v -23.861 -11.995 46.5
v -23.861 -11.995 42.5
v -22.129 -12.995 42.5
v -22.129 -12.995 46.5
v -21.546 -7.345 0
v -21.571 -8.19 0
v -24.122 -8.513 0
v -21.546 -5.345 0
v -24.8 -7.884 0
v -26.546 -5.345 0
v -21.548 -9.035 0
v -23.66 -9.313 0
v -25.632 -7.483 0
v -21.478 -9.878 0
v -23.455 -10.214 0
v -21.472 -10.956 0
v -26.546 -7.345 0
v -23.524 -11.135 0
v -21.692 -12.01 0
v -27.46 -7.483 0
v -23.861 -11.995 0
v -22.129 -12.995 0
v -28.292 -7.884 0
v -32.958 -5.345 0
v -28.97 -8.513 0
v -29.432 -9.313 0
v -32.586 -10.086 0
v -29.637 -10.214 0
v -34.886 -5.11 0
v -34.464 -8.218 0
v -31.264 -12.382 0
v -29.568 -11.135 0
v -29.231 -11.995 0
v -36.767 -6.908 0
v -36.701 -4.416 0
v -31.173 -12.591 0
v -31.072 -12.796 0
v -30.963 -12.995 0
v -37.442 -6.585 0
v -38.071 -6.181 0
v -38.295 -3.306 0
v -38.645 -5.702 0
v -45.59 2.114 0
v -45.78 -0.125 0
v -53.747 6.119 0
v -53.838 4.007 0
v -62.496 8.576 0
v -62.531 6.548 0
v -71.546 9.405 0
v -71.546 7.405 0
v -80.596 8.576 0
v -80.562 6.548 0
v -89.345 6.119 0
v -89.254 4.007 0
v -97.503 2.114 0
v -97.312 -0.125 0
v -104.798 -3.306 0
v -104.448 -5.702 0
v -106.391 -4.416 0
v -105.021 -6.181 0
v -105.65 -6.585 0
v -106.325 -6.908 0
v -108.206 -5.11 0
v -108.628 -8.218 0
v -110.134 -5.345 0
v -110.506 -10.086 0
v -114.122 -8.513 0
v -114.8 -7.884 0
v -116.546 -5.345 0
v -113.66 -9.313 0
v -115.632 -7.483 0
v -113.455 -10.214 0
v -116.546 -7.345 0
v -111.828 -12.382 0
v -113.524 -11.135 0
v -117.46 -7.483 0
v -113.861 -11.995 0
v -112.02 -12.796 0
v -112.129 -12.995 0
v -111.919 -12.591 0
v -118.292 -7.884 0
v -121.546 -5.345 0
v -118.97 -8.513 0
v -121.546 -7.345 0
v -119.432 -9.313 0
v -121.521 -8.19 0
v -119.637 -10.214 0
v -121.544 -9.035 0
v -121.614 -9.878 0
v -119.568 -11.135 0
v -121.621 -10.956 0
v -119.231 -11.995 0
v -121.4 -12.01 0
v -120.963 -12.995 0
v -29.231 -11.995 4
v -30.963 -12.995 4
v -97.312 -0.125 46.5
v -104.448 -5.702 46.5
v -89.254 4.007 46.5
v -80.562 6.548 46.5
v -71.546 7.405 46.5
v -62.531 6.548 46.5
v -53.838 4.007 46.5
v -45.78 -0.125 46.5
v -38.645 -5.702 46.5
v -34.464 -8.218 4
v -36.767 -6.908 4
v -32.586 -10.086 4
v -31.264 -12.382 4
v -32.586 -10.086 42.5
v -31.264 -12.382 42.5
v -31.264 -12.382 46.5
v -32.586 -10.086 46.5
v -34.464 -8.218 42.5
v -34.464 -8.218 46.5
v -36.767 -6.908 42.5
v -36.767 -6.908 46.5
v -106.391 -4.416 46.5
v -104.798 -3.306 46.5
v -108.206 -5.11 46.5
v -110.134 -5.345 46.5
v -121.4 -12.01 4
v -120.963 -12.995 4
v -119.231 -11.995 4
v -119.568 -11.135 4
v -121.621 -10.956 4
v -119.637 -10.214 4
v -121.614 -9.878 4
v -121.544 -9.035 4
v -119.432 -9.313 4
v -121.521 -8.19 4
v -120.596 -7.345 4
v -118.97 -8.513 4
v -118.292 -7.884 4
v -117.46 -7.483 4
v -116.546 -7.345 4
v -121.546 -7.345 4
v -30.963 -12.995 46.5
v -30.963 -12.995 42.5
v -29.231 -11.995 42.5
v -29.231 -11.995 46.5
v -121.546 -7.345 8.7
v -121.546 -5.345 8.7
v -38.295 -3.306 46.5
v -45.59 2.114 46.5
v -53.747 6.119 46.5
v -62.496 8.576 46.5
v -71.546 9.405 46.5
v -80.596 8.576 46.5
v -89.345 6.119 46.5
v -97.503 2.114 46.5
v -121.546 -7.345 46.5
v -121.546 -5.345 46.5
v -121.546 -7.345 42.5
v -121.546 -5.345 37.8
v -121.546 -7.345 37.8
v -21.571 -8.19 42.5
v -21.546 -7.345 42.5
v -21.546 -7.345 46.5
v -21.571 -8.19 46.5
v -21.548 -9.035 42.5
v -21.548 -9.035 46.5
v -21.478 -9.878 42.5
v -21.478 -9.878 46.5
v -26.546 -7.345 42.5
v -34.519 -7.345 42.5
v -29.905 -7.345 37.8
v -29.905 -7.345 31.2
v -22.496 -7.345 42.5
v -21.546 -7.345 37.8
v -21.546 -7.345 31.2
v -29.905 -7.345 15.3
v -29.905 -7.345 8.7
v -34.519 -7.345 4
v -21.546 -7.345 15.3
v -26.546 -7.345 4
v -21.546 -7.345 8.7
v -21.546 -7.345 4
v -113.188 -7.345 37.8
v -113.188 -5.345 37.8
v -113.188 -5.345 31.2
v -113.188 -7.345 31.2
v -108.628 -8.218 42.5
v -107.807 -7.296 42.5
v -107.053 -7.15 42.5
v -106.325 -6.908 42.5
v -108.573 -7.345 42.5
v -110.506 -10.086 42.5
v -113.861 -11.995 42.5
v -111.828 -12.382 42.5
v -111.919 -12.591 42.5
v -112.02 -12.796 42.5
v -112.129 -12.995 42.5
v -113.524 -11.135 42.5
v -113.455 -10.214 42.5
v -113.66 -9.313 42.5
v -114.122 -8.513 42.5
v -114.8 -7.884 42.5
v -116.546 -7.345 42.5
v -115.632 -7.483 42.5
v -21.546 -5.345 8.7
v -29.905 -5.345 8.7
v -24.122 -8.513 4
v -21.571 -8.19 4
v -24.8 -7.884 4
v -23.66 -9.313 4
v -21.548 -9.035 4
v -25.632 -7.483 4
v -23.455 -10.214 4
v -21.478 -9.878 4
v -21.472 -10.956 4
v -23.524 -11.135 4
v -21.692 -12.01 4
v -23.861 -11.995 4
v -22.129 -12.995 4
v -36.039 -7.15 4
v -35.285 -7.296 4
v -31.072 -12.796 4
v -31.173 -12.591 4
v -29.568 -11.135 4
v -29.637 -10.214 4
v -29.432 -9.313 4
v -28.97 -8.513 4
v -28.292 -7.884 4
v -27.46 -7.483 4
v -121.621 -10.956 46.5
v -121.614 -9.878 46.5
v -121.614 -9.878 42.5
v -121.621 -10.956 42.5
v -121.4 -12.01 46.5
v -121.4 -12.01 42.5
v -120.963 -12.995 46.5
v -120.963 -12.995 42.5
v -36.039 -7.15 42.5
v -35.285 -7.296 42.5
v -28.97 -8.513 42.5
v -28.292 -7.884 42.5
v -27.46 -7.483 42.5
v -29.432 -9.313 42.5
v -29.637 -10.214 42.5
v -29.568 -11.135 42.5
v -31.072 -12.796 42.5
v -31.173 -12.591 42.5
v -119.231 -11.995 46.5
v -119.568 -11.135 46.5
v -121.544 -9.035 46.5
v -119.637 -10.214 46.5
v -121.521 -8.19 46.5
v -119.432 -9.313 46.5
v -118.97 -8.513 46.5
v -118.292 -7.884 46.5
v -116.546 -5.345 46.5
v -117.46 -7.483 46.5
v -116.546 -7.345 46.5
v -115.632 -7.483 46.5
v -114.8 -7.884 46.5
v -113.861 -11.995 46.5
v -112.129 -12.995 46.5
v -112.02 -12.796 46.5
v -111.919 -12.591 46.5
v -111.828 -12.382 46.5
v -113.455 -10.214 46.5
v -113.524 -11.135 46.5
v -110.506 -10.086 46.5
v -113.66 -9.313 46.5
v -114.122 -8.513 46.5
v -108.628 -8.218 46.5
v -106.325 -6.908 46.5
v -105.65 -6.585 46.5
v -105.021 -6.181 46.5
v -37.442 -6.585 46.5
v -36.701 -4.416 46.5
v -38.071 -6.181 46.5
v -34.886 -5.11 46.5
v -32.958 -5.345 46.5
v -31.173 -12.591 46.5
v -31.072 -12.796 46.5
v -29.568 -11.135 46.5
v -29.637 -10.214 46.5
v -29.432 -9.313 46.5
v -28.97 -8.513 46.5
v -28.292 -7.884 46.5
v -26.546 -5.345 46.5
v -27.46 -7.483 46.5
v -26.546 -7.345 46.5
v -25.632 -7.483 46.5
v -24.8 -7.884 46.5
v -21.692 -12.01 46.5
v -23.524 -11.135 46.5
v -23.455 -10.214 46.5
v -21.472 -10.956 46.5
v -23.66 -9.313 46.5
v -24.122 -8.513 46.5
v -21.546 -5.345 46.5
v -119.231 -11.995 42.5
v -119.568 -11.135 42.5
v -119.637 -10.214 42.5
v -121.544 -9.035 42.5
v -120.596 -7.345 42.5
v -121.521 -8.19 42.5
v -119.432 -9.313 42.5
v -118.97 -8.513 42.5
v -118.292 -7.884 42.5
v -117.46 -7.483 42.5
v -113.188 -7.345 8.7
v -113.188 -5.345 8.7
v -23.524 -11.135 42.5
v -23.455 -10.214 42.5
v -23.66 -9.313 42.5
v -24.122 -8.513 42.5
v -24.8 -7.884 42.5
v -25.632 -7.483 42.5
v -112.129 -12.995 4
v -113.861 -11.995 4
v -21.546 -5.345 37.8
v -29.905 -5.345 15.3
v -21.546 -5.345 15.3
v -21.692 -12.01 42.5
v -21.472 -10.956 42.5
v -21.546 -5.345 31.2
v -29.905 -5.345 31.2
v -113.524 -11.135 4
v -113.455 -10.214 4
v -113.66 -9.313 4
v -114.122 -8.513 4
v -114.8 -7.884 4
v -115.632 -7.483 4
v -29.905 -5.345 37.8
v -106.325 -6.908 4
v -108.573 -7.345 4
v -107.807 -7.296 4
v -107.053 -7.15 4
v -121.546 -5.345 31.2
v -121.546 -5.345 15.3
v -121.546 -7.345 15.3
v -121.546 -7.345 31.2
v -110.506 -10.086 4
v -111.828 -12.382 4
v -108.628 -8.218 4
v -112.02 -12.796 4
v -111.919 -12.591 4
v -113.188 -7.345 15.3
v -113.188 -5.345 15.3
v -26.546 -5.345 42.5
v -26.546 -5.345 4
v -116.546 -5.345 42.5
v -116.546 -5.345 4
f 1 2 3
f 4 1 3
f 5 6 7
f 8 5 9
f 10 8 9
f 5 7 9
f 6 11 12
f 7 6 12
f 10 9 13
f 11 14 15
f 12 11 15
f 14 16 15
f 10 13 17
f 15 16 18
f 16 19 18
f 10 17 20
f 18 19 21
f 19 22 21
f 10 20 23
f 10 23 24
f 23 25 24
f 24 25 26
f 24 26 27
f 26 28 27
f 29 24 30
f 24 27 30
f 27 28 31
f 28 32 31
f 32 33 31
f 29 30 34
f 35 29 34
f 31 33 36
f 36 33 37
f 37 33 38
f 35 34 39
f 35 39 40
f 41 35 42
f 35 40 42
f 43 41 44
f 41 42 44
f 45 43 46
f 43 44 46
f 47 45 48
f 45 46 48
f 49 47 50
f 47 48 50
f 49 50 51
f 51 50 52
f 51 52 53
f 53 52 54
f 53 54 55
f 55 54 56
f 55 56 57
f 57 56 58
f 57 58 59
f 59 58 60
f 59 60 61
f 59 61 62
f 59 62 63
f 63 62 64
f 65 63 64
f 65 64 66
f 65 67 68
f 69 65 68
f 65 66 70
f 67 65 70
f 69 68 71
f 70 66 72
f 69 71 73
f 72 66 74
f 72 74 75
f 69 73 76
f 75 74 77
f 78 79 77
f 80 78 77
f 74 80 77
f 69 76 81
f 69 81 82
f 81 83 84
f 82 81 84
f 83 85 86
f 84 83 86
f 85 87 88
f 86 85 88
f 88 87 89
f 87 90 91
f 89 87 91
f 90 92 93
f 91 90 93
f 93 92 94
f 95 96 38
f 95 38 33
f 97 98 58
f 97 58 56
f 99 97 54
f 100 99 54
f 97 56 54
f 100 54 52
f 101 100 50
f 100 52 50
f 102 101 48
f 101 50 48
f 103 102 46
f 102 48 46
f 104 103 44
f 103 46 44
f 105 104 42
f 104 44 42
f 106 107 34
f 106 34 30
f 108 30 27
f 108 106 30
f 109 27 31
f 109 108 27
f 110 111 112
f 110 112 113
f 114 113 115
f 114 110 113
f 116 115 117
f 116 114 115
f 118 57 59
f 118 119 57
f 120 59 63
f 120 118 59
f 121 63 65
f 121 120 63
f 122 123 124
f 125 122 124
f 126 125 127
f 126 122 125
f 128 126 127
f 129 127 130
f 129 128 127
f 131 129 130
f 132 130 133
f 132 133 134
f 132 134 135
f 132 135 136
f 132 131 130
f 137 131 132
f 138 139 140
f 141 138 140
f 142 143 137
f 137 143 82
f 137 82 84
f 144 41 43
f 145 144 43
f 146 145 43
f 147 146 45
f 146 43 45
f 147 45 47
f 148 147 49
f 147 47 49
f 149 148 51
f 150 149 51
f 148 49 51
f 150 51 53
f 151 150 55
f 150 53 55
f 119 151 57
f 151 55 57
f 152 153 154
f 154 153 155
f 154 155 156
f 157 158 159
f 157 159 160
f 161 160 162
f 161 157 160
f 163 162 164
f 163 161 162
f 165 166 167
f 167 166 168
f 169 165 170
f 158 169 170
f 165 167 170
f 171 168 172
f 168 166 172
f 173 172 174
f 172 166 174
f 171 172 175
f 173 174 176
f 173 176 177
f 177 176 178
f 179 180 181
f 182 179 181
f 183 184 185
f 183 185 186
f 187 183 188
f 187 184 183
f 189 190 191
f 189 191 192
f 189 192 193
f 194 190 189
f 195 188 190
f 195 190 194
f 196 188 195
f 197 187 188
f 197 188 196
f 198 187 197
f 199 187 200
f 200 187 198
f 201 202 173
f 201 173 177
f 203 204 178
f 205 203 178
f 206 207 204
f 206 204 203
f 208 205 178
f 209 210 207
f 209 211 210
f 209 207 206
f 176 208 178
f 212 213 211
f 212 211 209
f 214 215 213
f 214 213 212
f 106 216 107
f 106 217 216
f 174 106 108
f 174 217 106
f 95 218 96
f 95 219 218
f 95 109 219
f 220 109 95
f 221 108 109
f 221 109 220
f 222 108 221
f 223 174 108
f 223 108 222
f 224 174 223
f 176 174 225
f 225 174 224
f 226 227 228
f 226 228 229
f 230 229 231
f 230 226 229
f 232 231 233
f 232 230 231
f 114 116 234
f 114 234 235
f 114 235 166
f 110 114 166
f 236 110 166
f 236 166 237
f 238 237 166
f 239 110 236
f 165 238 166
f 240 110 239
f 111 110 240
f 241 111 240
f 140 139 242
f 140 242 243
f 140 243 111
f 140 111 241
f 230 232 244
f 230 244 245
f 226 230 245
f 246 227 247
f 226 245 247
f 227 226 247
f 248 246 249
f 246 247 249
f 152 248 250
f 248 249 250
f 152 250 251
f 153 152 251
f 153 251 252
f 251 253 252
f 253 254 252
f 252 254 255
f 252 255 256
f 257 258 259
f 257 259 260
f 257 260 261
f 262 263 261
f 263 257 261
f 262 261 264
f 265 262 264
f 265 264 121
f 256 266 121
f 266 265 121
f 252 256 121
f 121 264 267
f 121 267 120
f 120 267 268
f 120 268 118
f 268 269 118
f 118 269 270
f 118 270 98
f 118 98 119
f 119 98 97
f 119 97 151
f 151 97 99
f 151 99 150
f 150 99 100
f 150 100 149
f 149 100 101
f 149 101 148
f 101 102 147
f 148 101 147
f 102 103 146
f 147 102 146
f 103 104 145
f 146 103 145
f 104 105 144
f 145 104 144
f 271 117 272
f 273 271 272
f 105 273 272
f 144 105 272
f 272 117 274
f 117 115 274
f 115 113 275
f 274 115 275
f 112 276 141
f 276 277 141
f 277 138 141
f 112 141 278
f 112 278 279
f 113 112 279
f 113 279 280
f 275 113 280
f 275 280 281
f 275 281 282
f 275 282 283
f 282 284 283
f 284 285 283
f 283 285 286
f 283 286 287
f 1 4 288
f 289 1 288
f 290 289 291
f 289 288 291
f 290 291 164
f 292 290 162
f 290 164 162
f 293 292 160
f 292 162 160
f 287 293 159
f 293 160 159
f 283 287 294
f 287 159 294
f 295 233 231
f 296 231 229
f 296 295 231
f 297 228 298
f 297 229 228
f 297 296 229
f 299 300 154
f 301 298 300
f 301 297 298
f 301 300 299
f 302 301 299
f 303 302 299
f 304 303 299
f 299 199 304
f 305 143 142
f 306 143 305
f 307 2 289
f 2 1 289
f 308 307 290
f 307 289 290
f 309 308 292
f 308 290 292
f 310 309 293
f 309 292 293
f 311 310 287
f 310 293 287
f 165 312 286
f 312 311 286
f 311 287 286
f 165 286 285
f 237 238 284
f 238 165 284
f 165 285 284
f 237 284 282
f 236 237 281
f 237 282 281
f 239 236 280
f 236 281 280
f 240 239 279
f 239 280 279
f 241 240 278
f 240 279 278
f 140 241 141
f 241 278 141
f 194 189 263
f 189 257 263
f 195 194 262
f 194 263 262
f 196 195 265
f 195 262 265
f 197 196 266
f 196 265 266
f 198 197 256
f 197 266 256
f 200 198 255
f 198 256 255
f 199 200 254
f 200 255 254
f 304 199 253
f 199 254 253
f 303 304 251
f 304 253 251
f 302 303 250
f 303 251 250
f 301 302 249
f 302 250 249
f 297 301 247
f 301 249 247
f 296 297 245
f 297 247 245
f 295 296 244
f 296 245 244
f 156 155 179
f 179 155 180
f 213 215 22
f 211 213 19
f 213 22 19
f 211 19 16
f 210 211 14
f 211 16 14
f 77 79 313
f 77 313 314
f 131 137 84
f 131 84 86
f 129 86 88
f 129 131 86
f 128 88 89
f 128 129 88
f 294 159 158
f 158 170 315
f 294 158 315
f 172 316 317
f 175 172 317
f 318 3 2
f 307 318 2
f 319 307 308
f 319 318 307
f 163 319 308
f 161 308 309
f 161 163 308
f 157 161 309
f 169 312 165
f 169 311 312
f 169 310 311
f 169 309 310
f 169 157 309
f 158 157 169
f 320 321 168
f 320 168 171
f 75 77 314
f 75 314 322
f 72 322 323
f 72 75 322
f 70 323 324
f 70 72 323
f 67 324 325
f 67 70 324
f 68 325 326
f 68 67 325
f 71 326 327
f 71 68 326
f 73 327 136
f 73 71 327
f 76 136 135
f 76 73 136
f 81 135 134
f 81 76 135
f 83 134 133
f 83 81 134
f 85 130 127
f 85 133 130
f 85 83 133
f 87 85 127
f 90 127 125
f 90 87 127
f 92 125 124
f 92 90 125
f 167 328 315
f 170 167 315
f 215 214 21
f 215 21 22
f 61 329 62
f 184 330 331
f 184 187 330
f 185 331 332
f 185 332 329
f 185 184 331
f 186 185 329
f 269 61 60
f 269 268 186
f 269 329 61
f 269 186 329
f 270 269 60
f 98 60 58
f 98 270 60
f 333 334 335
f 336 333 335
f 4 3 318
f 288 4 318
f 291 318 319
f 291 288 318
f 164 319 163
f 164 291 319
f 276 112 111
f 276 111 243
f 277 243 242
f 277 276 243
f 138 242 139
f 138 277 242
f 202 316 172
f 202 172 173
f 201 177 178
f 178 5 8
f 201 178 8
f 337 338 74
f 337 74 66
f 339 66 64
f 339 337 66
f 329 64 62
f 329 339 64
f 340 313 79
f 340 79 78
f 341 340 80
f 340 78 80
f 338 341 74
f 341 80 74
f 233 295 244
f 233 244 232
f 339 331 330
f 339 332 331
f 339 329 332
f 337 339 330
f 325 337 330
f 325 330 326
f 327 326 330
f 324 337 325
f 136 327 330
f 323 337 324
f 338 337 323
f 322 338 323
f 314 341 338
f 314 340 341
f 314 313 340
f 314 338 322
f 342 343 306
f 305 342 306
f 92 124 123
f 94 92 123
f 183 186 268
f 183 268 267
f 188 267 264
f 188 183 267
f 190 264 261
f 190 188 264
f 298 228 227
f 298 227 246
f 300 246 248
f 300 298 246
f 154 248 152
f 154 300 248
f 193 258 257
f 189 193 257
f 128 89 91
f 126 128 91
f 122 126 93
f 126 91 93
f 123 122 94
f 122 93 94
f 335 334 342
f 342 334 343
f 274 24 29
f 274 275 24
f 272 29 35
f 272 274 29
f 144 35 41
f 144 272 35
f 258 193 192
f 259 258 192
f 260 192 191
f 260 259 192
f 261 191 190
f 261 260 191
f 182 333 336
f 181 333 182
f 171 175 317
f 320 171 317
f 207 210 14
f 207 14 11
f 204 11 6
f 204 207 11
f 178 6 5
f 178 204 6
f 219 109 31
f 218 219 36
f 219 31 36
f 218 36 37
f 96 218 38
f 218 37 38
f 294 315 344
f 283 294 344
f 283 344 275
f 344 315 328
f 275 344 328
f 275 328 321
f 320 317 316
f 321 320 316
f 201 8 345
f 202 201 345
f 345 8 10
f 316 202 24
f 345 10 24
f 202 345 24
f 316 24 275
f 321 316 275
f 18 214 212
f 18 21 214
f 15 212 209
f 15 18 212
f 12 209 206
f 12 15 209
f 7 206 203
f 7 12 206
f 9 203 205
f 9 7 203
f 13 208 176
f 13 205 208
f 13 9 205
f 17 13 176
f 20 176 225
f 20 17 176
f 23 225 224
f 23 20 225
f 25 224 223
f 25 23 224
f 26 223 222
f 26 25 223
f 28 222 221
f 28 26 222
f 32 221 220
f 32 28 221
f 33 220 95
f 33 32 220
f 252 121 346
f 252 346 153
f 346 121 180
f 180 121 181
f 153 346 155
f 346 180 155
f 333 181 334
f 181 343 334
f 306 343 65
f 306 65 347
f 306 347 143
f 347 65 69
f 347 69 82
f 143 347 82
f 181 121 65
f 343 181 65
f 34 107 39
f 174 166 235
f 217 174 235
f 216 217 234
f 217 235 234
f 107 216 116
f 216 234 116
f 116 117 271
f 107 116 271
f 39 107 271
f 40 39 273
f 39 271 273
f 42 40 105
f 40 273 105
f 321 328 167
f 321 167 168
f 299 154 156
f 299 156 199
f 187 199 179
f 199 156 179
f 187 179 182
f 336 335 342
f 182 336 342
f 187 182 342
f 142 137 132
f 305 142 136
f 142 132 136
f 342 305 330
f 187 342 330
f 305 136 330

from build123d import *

# Parameters (mm, degrees)
SKETCH3_R             = 5.1
SKETCH3_R_2           = 3.1
BOSS_EXTRUDE2_DEPTH   = 4
BOSS_EXTRUDE2_2_DEPTH = 4
CUT_EXTRUDE1_DEPTH    = 4
BOSS_EXTRUDE3_START   = -23.25
BOSS_EXTRUDE3_DEPTH   = 46.5
SKETCH7_W             = 9.658407056
SKETCH7_H             = 6.6
CUT_EXTRUDE2_DEPTH    = 2
FILLET1_R             = 8
FILLET2_R             = 6
FILLET3_R             = 10
FILLET4_R             = 15


with BuildPart() as part:
    # Sketch3 → Boss-Extrude2 (new body)
    with BuildSketch(Plane.XY):
        with Locations((-116.546102611, -10.445456474)):
            Circle(SKETCH3_R)
        with Locations((-116.546102611, -10.445456474)):
            Circle(SKETCH3_R_2, mode=Mode.SUBTRACT)
    extrude(amount=BOSS_EXTRUDE2_DEPTH)


with BuildPart() as body_2:
    # Sketch3 → Boss-Extrude2 2 (new body)
    with BuildSketch(Plane.XY):
        with Locations(Location((-26.546102611, -10.445456474, 0), (0, 0, 180))):
            Circle(SKETCH3_R)
        with Locations(Location((-26.546102611, -10.445456474, 0), (0, 0, 180))):
            Circle(SKETCH3_R_2, mode=Mode.SUBTRACT)
    extrude(amount=BOSS_EXTRUDE2_2_DEPTH)


with BuildPart() as cut_extrude1_tool:
    # Sketch4 → Cut-Extrude1 (new body)
    with BuildSketch(Plane.XY.offset(4)):
        Polygon((-116.546102611, -10.445456474), (-134.15945469, -20.614530038), (-98.932750532, -20.614530038), align=None)
        Polygon((-26.546102611, -10.445456474), (-8.932750532, -20.614530038), (-44.15945469, -20.614530038), align=None)
    extrude(amount=-CUT_EXTRUDE1_DEPTH)


with BuildPart() as part_1:
    add(part.part)

    # Cut-Extrude1: cut by cut_extrude1_tool
    add(cut_extrude1_tool.part, mode=Mode.SUBTRACT)


with BuildPart() as body_2_1:
    add(body_2.part)

    # Cut-Extrude1: cut by cut_extrude1_tool
    add(cut_extrude1_tool.part, mode=Mode.SUBTRACT)


with BuildPart() as body_3:
    # Mirror2: mirrored copy
    add(part_1.part.mirror(Plane.XY.offset(23.25)))


with BuildPart() as body_4:
    # Mirror2 2: mirrored copy
    add(body_2_1.part.mirror(Plane.XY.offset(23.25)))


with BuildPart() as part_2:
    add(part_1.part)

    add(body_2_1.part)  # Boss-Extrude3 merges body 2

    add(body_3.part)  # Boss-Extrude3 merges body 3

    add(body_4.part)  # Boss-Extrude3 merges body 4
    # Sketch6 → Boss-Extrude3 (add)
    with BuildSketch(Plane.XY.offset(23.25).offset(BOSS_EXTRUDE3_START)):
        with BuildLine():
            Line((-121.546102611, -7.345456474), (-106.100588572, -7.345456474))
            ThreePointArc((-106.100588572, -7.345456474), (-71.546102611, 7.404543526), (-36.99161665, -7.345456474))
            Line((-36.99161665, -7.345456474), (-21.546102611, -7.345456474))
            Line((-21.546102611, -7.345456474), (-21.546102611, -5.345456474))
            Line((-21.546102611, -5.345456474), (-36.148186006, -5.345456474))
            ThreePointArc((-36.148186006, -5.345456474), (-71.546102611, 9.404543526), (-106.944019216, -5.345456474))
            Line((-106.944019216, -5.345456474), (-121.546102611, -5.345456474))
            Line((-121.546102611, -5.345456474), (-121.546102611, -7.345456474))
        make_face()
    extrude(amount=BOSS_EXTRUDE3_DEPTH)

    # Sketch7 → Cut-Extrude2 (cut)
    with BuildSketch(Plane(origin=(0, -5.345456474, 0), x_dir=(1, 0, 0), z_dir=(0, 1, 0))):
        with Locations((-118.016899083, -12)):
            Rectangle(SKETCH7_W, SKETCH7_H)
        with Locations((-118.016899083, -34.5)):
            Rectangle(SKETCH7_W, SKETCH7_H)
        with Locations((-25.075306139, -34.5)):
            Rectangle(SKETCH7_W, SKETCH7_H)
        with Locations((-25.075306139, -12)):
            Rectangle(SKETCH7_W, SKETCH7_H)
    extrude(amount=-CUT_EXTRUDE2_DEPTH, mode=Mode.SUBTRACT)

    # Fillet1
    fillet1_edges = [part_2.edges().sort_by_distance(p)[0] for p in [
        (-36.148186006, -5.345456474, 23.25),
        (-106.944019216, -5.345456474, 23.25),
    ]]
    fillet(fillet1_edges, radius=FILLET1_R)

    # Fillet2
    fillet2_edges = [part_2.edges().sort_by_distance(p)[0] for p in [
        (-106.100588572, -7.345456474, 23.25),
        (-36.99161665, -7.345456474, 23.25),
    ]]
    fillet(fillet2_edges, radius=FILLET2_R)

    # Fillet3
    # the kernel refuses this fillet: 10 mm, written as the material it adds along each edge
    with BuildSketch(Plane(origin=(-112.496411265, -7.345456474, 4), x_dir=(0.9974995155199412, 0.07067330852226088, 0), z_dir=(0, 0, -1)), Plane(origin=(-30.595793957, -7.345456474, 42.5), x_dir=(-0.9974995155199468, 0.07067330852218129, 0), z_dir=(0, 0, 1))) as fillet3_piece_1:
        with BuildLine():
            CenterArc((9.270136929, 9.512895054), FILLET3_R, 206.369759274, 45.673490189)
            Line((0.310673789, 5.07127145), (-0.585272525, 4.62710909))
            ThreePointArc((-0.585272525, 4.62710909), (-0.16632442, 2.555341186), (-0.835029885, 0.550204591))
            Line((-0.835029885, 0.550204591), (0.070673309, -0.997499516))
            ThreePointArc((0.070673309, -0.997499516), (3.983986296, -0.720239455), (5.878847867, -0.951289505))
            Line((5.878847867, -0.951289505), (6.187146873, 0))
        make_face()
    extrude(amount=4)
    with BuildSketch(Plane(origin=(-112.496411265, -7.345456474, 42.5), x_dir=(0.9974995155199412, 0.07067330852226088, 0), z_dir=(0, 0, 1)), Plane(origin=(-30.595793957, -7.345456474, 4), x_dir=(-0.9974995155199468, 0.07067330852218129, 0), z_dir=(0, 0, -1))) as fillet3_piece_2:
        with BuildLine():
            CenterArc((9.270136929, -9.512895054), FILLET3_R, 107.956750537, 45.673490189)
            Line((0.310673789, -5.07127145), (-0.585272525, -4.62710909))
            ThreePointArc((-0.585272525, -4.62710909), (-0.16632442, -2.555341186), (-0.835029885, -0.550204591))
            Line((-0.835029885, -0.550204591), (0.070673309, 0.997499516))
            ThreePointArc((0.070673309, 0.997499516), (3.983986296, 0.720239455), (5.878847867, 0.951289505))
            Line((5.878847867, 0.951289505), (6.187146873, 0))
        make_face()
    extrude(amount=4)

    # Fillet4
    # the kernel refuses this fillet: 15 mm, written as the material it adds along each edge
    with BuildSketch(Plane(origin=(-120.595793957, -7.345456474, 4), x_dir=(-0.37317563120438824, -0.9277607171438153, 0), z_dir=(0, 0, -1)), Plane(origin=(-22.496411265, -7.345456474, 42.5), x_dir=(0.3731756312044104, -0.9277607171438064, 0), z_dir=(0, 0, 1))) as fillet4_piece_1:
        with BuildLine():
            CenterArc((6.743777429, 14.452908836), FILLET4_R, 244.789631476, 9.688258422)
            Line((0.354632032, 0.881659038), (0, 0))
            ThreePointArc((0, 0), (1.364812099, 0.186010996), (2.729624198, 0))
        make_face()
    extrude(amount=4)
    with BuildSketch(Plane(origin=(-120.595793957, -7.345456474, 42.5), x_dir=(-0.37317563120438824, -0.9277607171438153, 0), z_dir=(0, 0, 1))) as fillet4_piece_2:
        with BuildLine():
            CenterArc((6.743777429, -14.452908836), FILLET4_R, 105.522110102, 9.688258422)
            Line((0.354632032, -0.881659038), (0, 0))
            ThreePointArc((0, 0), (1.364812099, -0.186010996), (2.729624198, 0))
        make_face()
    extrude(amount=4)
    with BuildSketch(Plane(origin=(-22.496411265, -7.345456474, 4), x_dir=(1, 0, 0), z_dir=(0, 0, -1))) as fillet4_piece_3:
        with BuildLine():
            CenterArc((15.925454466, 0.863138406), FILLET4_R, 173.610509594, 9.688258422)
            ThreePointArc((1.018629233, 2.532438103), (0.681888311, 1.196804281), (0, 0))
            Line((0, 0), (0.950308654, 0))
        make_face()
    extrude(amount=4)


solid = part_2.part
